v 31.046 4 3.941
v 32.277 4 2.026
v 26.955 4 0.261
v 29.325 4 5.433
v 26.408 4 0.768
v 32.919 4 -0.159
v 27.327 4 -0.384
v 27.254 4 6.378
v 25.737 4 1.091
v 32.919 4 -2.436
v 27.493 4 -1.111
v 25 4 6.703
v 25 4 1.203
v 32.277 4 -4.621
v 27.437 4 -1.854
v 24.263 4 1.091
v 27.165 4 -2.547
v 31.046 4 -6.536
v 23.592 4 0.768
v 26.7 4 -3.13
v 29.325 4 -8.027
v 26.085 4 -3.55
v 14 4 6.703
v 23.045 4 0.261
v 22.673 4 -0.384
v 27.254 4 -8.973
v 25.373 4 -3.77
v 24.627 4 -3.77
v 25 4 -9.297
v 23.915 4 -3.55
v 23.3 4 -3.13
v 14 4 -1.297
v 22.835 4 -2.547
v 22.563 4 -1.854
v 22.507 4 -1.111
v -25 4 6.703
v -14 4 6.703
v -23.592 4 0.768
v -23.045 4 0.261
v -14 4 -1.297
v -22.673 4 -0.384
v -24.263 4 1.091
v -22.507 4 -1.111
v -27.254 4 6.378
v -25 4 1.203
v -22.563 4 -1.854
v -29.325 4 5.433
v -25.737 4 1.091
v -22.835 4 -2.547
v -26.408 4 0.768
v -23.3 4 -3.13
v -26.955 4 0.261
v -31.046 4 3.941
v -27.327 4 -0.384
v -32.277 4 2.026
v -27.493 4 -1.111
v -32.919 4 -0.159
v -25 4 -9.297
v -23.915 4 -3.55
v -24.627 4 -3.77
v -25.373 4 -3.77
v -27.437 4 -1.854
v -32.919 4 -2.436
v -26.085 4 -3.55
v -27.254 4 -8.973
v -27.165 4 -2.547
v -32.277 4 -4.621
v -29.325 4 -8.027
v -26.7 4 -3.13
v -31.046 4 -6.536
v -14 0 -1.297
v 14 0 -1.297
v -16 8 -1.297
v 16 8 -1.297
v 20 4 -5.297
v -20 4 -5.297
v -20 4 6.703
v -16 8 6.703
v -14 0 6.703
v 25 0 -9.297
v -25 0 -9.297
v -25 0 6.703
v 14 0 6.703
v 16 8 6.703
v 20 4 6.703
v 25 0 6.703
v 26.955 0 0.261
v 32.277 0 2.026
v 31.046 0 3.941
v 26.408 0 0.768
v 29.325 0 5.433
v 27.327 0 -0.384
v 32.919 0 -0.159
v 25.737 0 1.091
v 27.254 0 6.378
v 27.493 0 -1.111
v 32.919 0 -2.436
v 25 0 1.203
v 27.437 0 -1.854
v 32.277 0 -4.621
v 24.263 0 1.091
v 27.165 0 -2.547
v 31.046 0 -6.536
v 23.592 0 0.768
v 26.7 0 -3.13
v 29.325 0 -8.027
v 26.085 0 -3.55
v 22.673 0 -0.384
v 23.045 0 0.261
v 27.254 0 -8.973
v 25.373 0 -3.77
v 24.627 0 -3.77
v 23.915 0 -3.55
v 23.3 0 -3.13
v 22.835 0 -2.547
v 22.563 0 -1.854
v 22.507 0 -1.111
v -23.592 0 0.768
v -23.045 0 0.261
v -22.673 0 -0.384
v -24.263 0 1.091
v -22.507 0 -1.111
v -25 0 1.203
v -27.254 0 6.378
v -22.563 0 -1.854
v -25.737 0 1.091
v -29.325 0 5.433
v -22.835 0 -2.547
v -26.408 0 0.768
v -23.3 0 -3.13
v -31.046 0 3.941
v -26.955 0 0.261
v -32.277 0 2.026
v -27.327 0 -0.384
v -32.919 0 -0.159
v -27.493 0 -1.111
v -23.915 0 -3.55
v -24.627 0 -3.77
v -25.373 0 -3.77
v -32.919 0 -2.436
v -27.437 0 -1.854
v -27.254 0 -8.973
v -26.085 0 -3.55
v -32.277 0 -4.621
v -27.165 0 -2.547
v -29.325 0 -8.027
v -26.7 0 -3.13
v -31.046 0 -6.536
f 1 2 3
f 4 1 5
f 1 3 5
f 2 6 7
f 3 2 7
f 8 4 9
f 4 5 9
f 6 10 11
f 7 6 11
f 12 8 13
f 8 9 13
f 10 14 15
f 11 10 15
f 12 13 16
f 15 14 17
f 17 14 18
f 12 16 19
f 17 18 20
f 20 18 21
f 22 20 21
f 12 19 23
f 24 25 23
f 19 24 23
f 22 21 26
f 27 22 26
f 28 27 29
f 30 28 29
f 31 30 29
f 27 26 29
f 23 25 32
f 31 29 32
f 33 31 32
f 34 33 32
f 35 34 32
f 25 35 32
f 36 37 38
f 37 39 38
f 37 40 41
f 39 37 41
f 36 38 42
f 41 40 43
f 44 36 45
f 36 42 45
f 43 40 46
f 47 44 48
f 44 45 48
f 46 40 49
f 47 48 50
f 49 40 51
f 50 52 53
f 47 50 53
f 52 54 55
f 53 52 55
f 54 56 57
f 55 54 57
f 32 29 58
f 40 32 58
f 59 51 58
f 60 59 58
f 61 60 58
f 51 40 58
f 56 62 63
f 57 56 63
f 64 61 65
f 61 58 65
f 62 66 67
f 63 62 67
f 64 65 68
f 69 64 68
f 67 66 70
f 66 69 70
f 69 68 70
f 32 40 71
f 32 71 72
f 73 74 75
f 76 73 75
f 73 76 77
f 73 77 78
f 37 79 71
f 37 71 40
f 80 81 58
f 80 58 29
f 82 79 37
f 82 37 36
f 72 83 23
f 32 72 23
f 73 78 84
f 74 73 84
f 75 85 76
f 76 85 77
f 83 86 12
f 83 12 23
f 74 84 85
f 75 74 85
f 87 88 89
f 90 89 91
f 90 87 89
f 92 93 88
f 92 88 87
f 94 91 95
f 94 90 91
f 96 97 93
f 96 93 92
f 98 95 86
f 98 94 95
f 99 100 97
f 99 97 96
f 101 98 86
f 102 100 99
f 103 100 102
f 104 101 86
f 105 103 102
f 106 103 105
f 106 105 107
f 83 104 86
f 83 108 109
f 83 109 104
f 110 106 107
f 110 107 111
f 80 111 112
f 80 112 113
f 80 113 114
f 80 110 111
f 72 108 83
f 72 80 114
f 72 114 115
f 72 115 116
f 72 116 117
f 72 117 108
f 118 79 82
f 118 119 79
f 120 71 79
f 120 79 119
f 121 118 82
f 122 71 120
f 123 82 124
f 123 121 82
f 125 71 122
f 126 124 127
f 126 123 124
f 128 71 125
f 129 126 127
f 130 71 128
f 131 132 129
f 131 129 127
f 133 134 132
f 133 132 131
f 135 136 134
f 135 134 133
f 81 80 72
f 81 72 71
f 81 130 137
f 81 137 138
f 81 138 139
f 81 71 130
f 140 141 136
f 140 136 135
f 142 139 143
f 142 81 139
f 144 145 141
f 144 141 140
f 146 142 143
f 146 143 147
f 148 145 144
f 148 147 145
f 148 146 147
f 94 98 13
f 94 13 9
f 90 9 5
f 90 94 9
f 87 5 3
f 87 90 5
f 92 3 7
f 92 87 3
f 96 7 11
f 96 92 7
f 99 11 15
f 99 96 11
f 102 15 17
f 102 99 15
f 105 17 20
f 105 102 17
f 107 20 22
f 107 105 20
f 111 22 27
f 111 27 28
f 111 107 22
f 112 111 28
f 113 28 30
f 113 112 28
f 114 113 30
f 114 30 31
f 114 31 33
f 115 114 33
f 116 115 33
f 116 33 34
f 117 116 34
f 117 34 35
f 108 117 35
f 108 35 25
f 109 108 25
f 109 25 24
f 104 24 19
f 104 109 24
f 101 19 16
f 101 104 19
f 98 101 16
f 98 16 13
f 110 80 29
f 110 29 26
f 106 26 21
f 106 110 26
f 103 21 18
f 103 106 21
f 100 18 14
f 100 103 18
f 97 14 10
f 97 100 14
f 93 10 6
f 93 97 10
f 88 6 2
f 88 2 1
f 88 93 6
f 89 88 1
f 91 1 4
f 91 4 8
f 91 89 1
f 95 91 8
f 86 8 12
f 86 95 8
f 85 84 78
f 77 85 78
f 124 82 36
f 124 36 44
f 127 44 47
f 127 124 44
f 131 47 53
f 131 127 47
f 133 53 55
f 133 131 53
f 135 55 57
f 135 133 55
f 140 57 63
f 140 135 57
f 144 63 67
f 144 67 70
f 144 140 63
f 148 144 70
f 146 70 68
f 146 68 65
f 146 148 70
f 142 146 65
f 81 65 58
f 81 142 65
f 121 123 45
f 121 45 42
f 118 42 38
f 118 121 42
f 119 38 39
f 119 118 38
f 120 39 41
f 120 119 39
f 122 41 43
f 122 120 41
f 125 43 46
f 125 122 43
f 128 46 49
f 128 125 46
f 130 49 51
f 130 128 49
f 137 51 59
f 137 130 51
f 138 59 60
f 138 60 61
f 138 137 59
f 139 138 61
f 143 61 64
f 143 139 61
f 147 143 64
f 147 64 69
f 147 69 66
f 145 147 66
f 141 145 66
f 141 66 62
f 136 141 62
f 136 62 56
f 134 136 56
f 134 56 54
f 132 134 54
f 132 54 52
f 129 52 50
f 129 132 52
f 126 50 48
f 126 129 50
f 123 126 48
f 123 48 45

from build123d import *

# Parameters (mm, degrees)
SKETCH_1_R               = 2.5
EXTRUDE_1_DEPTH          = 4
EXTRUDE_2_DEPTH          = 12
SKETCH_3_W               = 28
SKETCH_3_H               = 4
CUT_EXTRUDE_1_DEPTH      = 8
CUT_EXTRUDE_2_DEPTH      = 36.20571672
CUT_EXTRUDE_2_DEPTH_BACK = 36.20571672


with BuildPart() as part:
    # 草图1 → 凸台-拉伸1 (new body)
    with BuildSketch(Plane(origin=(0, 0, 0), x_dir=(1, 0, 0), z_dir=(0, 1, 0))):
        with BuildLine():
            Line((-25, 9.297445336), (25, 9.297445336))
            ThreePointArc((25, 9.297445336), (33, 1.297445336), (25, -6.702554664))
            Line((25, -6.702554664), (-25, -6.702554664))
            ThreePointArc((-25, -6.702554664), (-33, 1.297445336), (-25, 9.297445336))
        make_face()
        with Locations(Location((-25, 1.297445336, 0), (0, 0, 270))):
            Circle(SKETCH_1_R, mode=Mode.SUBTRACT)
        with Locations(Location((25, 1.297445336, 0), (0, 0, 270))):
            Circle(SKETCH_1_R, mode=Mode.SUBTRACT)
    extrude(amount=EXTRUDE_1_DEPTH)

    # 草图3 → 切除-拉伸1 (cut)
    with BuildSketch(Plane.XY.offset(6.702554664)):
        with Locations((0, 2)):
            Rectangle(SKETCH_3_W, SKETCH_3_H)
    extrude(amount=-CUT_EXTRUDE_1_DEPTH, mode=Mode.SUBTRACT)


with BuildPart() as body_2:
    # 草图2 → 凸台-拉伸2 (new body)
    with BuildSketch(Plane.XY.offset(6.702554664)):
        Polygon((-20, 4), (-16, 8), (16, 8), (20, 4), align=None)
    extrude(amount=-EXTRUDE_2_DEPTH)

    # 草图4 → 切除-拉伸2 (cut, two sides: drawn at the far end of the back side and taken through both)
    with BuildSketch(Plane(origin=(0, 0, 0), x_dir=(0, 0, -1), z_dir=(1, 0, 0)).offset(-CUT_EXTRUDE_2_DEPTH_BACK)):
        Polygon((5.297445336, 8), (1.297445336, 8), (5.297445336, 4), align=None)
    extrude(amount=CUT_EXTRUDE_2_DEPTH + CUT_EXTRUDE_2_DEPTH_BACK, mode=Mode.SUBTRACT)


solid = Compound([part.part, body_2.part])
